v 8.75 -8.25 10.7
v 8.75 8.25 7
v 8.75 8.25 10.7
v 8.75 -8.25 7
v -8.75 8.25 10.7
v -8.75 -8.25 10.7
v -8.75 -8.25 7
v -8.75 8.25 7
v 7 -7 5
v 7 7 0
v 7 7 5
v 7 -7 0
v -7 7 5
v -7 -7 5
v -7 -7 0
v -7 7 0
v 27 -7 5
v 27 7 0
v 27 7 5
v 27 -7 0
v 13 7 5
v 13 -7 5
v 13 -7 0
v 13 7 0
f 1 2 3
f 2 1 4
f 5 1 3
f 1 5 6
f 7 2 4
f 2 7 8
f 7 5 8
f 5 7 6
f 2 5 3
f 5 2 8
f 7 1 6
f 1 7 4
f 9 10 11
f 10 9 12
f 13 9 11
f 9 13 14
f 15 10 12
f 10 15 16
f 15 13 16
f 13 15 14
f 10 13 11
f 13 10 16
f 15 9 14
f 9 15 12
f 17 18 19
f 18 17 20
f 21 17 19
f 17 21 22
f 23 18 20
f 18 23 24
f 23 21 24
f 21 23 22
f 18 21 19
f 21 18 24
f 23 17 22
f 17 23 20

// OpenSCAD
module cherry(c="Indigo") {
  // $fs = 0.02;
  color(c)
  difference() {
    translate([0,0,2.5])
    cube([14, 14, 5], center=true);
    // cylinder(h=1, d=3.40, center=true);
  }
}

module cherry_1u_kc(c="Ivory") {
  color(c)
  translate([0,0,1.85])
  cube([17.5, 16.5, 3.7], center=true);
}

module cherry_1u(s="", c="Ivory", with_kc=true) {
  cherry();
  if (with_kc) {
    translate([0,0,7])
    difference() {
      cherry_1u_kc(c=c);
      translate([0,0,3.5]) text(s, size=5, halign="center", valign="center");
    }
  }
}

cherry_1u("A");
translate([20,0,0])
cherry_1u(with_kc=false);
